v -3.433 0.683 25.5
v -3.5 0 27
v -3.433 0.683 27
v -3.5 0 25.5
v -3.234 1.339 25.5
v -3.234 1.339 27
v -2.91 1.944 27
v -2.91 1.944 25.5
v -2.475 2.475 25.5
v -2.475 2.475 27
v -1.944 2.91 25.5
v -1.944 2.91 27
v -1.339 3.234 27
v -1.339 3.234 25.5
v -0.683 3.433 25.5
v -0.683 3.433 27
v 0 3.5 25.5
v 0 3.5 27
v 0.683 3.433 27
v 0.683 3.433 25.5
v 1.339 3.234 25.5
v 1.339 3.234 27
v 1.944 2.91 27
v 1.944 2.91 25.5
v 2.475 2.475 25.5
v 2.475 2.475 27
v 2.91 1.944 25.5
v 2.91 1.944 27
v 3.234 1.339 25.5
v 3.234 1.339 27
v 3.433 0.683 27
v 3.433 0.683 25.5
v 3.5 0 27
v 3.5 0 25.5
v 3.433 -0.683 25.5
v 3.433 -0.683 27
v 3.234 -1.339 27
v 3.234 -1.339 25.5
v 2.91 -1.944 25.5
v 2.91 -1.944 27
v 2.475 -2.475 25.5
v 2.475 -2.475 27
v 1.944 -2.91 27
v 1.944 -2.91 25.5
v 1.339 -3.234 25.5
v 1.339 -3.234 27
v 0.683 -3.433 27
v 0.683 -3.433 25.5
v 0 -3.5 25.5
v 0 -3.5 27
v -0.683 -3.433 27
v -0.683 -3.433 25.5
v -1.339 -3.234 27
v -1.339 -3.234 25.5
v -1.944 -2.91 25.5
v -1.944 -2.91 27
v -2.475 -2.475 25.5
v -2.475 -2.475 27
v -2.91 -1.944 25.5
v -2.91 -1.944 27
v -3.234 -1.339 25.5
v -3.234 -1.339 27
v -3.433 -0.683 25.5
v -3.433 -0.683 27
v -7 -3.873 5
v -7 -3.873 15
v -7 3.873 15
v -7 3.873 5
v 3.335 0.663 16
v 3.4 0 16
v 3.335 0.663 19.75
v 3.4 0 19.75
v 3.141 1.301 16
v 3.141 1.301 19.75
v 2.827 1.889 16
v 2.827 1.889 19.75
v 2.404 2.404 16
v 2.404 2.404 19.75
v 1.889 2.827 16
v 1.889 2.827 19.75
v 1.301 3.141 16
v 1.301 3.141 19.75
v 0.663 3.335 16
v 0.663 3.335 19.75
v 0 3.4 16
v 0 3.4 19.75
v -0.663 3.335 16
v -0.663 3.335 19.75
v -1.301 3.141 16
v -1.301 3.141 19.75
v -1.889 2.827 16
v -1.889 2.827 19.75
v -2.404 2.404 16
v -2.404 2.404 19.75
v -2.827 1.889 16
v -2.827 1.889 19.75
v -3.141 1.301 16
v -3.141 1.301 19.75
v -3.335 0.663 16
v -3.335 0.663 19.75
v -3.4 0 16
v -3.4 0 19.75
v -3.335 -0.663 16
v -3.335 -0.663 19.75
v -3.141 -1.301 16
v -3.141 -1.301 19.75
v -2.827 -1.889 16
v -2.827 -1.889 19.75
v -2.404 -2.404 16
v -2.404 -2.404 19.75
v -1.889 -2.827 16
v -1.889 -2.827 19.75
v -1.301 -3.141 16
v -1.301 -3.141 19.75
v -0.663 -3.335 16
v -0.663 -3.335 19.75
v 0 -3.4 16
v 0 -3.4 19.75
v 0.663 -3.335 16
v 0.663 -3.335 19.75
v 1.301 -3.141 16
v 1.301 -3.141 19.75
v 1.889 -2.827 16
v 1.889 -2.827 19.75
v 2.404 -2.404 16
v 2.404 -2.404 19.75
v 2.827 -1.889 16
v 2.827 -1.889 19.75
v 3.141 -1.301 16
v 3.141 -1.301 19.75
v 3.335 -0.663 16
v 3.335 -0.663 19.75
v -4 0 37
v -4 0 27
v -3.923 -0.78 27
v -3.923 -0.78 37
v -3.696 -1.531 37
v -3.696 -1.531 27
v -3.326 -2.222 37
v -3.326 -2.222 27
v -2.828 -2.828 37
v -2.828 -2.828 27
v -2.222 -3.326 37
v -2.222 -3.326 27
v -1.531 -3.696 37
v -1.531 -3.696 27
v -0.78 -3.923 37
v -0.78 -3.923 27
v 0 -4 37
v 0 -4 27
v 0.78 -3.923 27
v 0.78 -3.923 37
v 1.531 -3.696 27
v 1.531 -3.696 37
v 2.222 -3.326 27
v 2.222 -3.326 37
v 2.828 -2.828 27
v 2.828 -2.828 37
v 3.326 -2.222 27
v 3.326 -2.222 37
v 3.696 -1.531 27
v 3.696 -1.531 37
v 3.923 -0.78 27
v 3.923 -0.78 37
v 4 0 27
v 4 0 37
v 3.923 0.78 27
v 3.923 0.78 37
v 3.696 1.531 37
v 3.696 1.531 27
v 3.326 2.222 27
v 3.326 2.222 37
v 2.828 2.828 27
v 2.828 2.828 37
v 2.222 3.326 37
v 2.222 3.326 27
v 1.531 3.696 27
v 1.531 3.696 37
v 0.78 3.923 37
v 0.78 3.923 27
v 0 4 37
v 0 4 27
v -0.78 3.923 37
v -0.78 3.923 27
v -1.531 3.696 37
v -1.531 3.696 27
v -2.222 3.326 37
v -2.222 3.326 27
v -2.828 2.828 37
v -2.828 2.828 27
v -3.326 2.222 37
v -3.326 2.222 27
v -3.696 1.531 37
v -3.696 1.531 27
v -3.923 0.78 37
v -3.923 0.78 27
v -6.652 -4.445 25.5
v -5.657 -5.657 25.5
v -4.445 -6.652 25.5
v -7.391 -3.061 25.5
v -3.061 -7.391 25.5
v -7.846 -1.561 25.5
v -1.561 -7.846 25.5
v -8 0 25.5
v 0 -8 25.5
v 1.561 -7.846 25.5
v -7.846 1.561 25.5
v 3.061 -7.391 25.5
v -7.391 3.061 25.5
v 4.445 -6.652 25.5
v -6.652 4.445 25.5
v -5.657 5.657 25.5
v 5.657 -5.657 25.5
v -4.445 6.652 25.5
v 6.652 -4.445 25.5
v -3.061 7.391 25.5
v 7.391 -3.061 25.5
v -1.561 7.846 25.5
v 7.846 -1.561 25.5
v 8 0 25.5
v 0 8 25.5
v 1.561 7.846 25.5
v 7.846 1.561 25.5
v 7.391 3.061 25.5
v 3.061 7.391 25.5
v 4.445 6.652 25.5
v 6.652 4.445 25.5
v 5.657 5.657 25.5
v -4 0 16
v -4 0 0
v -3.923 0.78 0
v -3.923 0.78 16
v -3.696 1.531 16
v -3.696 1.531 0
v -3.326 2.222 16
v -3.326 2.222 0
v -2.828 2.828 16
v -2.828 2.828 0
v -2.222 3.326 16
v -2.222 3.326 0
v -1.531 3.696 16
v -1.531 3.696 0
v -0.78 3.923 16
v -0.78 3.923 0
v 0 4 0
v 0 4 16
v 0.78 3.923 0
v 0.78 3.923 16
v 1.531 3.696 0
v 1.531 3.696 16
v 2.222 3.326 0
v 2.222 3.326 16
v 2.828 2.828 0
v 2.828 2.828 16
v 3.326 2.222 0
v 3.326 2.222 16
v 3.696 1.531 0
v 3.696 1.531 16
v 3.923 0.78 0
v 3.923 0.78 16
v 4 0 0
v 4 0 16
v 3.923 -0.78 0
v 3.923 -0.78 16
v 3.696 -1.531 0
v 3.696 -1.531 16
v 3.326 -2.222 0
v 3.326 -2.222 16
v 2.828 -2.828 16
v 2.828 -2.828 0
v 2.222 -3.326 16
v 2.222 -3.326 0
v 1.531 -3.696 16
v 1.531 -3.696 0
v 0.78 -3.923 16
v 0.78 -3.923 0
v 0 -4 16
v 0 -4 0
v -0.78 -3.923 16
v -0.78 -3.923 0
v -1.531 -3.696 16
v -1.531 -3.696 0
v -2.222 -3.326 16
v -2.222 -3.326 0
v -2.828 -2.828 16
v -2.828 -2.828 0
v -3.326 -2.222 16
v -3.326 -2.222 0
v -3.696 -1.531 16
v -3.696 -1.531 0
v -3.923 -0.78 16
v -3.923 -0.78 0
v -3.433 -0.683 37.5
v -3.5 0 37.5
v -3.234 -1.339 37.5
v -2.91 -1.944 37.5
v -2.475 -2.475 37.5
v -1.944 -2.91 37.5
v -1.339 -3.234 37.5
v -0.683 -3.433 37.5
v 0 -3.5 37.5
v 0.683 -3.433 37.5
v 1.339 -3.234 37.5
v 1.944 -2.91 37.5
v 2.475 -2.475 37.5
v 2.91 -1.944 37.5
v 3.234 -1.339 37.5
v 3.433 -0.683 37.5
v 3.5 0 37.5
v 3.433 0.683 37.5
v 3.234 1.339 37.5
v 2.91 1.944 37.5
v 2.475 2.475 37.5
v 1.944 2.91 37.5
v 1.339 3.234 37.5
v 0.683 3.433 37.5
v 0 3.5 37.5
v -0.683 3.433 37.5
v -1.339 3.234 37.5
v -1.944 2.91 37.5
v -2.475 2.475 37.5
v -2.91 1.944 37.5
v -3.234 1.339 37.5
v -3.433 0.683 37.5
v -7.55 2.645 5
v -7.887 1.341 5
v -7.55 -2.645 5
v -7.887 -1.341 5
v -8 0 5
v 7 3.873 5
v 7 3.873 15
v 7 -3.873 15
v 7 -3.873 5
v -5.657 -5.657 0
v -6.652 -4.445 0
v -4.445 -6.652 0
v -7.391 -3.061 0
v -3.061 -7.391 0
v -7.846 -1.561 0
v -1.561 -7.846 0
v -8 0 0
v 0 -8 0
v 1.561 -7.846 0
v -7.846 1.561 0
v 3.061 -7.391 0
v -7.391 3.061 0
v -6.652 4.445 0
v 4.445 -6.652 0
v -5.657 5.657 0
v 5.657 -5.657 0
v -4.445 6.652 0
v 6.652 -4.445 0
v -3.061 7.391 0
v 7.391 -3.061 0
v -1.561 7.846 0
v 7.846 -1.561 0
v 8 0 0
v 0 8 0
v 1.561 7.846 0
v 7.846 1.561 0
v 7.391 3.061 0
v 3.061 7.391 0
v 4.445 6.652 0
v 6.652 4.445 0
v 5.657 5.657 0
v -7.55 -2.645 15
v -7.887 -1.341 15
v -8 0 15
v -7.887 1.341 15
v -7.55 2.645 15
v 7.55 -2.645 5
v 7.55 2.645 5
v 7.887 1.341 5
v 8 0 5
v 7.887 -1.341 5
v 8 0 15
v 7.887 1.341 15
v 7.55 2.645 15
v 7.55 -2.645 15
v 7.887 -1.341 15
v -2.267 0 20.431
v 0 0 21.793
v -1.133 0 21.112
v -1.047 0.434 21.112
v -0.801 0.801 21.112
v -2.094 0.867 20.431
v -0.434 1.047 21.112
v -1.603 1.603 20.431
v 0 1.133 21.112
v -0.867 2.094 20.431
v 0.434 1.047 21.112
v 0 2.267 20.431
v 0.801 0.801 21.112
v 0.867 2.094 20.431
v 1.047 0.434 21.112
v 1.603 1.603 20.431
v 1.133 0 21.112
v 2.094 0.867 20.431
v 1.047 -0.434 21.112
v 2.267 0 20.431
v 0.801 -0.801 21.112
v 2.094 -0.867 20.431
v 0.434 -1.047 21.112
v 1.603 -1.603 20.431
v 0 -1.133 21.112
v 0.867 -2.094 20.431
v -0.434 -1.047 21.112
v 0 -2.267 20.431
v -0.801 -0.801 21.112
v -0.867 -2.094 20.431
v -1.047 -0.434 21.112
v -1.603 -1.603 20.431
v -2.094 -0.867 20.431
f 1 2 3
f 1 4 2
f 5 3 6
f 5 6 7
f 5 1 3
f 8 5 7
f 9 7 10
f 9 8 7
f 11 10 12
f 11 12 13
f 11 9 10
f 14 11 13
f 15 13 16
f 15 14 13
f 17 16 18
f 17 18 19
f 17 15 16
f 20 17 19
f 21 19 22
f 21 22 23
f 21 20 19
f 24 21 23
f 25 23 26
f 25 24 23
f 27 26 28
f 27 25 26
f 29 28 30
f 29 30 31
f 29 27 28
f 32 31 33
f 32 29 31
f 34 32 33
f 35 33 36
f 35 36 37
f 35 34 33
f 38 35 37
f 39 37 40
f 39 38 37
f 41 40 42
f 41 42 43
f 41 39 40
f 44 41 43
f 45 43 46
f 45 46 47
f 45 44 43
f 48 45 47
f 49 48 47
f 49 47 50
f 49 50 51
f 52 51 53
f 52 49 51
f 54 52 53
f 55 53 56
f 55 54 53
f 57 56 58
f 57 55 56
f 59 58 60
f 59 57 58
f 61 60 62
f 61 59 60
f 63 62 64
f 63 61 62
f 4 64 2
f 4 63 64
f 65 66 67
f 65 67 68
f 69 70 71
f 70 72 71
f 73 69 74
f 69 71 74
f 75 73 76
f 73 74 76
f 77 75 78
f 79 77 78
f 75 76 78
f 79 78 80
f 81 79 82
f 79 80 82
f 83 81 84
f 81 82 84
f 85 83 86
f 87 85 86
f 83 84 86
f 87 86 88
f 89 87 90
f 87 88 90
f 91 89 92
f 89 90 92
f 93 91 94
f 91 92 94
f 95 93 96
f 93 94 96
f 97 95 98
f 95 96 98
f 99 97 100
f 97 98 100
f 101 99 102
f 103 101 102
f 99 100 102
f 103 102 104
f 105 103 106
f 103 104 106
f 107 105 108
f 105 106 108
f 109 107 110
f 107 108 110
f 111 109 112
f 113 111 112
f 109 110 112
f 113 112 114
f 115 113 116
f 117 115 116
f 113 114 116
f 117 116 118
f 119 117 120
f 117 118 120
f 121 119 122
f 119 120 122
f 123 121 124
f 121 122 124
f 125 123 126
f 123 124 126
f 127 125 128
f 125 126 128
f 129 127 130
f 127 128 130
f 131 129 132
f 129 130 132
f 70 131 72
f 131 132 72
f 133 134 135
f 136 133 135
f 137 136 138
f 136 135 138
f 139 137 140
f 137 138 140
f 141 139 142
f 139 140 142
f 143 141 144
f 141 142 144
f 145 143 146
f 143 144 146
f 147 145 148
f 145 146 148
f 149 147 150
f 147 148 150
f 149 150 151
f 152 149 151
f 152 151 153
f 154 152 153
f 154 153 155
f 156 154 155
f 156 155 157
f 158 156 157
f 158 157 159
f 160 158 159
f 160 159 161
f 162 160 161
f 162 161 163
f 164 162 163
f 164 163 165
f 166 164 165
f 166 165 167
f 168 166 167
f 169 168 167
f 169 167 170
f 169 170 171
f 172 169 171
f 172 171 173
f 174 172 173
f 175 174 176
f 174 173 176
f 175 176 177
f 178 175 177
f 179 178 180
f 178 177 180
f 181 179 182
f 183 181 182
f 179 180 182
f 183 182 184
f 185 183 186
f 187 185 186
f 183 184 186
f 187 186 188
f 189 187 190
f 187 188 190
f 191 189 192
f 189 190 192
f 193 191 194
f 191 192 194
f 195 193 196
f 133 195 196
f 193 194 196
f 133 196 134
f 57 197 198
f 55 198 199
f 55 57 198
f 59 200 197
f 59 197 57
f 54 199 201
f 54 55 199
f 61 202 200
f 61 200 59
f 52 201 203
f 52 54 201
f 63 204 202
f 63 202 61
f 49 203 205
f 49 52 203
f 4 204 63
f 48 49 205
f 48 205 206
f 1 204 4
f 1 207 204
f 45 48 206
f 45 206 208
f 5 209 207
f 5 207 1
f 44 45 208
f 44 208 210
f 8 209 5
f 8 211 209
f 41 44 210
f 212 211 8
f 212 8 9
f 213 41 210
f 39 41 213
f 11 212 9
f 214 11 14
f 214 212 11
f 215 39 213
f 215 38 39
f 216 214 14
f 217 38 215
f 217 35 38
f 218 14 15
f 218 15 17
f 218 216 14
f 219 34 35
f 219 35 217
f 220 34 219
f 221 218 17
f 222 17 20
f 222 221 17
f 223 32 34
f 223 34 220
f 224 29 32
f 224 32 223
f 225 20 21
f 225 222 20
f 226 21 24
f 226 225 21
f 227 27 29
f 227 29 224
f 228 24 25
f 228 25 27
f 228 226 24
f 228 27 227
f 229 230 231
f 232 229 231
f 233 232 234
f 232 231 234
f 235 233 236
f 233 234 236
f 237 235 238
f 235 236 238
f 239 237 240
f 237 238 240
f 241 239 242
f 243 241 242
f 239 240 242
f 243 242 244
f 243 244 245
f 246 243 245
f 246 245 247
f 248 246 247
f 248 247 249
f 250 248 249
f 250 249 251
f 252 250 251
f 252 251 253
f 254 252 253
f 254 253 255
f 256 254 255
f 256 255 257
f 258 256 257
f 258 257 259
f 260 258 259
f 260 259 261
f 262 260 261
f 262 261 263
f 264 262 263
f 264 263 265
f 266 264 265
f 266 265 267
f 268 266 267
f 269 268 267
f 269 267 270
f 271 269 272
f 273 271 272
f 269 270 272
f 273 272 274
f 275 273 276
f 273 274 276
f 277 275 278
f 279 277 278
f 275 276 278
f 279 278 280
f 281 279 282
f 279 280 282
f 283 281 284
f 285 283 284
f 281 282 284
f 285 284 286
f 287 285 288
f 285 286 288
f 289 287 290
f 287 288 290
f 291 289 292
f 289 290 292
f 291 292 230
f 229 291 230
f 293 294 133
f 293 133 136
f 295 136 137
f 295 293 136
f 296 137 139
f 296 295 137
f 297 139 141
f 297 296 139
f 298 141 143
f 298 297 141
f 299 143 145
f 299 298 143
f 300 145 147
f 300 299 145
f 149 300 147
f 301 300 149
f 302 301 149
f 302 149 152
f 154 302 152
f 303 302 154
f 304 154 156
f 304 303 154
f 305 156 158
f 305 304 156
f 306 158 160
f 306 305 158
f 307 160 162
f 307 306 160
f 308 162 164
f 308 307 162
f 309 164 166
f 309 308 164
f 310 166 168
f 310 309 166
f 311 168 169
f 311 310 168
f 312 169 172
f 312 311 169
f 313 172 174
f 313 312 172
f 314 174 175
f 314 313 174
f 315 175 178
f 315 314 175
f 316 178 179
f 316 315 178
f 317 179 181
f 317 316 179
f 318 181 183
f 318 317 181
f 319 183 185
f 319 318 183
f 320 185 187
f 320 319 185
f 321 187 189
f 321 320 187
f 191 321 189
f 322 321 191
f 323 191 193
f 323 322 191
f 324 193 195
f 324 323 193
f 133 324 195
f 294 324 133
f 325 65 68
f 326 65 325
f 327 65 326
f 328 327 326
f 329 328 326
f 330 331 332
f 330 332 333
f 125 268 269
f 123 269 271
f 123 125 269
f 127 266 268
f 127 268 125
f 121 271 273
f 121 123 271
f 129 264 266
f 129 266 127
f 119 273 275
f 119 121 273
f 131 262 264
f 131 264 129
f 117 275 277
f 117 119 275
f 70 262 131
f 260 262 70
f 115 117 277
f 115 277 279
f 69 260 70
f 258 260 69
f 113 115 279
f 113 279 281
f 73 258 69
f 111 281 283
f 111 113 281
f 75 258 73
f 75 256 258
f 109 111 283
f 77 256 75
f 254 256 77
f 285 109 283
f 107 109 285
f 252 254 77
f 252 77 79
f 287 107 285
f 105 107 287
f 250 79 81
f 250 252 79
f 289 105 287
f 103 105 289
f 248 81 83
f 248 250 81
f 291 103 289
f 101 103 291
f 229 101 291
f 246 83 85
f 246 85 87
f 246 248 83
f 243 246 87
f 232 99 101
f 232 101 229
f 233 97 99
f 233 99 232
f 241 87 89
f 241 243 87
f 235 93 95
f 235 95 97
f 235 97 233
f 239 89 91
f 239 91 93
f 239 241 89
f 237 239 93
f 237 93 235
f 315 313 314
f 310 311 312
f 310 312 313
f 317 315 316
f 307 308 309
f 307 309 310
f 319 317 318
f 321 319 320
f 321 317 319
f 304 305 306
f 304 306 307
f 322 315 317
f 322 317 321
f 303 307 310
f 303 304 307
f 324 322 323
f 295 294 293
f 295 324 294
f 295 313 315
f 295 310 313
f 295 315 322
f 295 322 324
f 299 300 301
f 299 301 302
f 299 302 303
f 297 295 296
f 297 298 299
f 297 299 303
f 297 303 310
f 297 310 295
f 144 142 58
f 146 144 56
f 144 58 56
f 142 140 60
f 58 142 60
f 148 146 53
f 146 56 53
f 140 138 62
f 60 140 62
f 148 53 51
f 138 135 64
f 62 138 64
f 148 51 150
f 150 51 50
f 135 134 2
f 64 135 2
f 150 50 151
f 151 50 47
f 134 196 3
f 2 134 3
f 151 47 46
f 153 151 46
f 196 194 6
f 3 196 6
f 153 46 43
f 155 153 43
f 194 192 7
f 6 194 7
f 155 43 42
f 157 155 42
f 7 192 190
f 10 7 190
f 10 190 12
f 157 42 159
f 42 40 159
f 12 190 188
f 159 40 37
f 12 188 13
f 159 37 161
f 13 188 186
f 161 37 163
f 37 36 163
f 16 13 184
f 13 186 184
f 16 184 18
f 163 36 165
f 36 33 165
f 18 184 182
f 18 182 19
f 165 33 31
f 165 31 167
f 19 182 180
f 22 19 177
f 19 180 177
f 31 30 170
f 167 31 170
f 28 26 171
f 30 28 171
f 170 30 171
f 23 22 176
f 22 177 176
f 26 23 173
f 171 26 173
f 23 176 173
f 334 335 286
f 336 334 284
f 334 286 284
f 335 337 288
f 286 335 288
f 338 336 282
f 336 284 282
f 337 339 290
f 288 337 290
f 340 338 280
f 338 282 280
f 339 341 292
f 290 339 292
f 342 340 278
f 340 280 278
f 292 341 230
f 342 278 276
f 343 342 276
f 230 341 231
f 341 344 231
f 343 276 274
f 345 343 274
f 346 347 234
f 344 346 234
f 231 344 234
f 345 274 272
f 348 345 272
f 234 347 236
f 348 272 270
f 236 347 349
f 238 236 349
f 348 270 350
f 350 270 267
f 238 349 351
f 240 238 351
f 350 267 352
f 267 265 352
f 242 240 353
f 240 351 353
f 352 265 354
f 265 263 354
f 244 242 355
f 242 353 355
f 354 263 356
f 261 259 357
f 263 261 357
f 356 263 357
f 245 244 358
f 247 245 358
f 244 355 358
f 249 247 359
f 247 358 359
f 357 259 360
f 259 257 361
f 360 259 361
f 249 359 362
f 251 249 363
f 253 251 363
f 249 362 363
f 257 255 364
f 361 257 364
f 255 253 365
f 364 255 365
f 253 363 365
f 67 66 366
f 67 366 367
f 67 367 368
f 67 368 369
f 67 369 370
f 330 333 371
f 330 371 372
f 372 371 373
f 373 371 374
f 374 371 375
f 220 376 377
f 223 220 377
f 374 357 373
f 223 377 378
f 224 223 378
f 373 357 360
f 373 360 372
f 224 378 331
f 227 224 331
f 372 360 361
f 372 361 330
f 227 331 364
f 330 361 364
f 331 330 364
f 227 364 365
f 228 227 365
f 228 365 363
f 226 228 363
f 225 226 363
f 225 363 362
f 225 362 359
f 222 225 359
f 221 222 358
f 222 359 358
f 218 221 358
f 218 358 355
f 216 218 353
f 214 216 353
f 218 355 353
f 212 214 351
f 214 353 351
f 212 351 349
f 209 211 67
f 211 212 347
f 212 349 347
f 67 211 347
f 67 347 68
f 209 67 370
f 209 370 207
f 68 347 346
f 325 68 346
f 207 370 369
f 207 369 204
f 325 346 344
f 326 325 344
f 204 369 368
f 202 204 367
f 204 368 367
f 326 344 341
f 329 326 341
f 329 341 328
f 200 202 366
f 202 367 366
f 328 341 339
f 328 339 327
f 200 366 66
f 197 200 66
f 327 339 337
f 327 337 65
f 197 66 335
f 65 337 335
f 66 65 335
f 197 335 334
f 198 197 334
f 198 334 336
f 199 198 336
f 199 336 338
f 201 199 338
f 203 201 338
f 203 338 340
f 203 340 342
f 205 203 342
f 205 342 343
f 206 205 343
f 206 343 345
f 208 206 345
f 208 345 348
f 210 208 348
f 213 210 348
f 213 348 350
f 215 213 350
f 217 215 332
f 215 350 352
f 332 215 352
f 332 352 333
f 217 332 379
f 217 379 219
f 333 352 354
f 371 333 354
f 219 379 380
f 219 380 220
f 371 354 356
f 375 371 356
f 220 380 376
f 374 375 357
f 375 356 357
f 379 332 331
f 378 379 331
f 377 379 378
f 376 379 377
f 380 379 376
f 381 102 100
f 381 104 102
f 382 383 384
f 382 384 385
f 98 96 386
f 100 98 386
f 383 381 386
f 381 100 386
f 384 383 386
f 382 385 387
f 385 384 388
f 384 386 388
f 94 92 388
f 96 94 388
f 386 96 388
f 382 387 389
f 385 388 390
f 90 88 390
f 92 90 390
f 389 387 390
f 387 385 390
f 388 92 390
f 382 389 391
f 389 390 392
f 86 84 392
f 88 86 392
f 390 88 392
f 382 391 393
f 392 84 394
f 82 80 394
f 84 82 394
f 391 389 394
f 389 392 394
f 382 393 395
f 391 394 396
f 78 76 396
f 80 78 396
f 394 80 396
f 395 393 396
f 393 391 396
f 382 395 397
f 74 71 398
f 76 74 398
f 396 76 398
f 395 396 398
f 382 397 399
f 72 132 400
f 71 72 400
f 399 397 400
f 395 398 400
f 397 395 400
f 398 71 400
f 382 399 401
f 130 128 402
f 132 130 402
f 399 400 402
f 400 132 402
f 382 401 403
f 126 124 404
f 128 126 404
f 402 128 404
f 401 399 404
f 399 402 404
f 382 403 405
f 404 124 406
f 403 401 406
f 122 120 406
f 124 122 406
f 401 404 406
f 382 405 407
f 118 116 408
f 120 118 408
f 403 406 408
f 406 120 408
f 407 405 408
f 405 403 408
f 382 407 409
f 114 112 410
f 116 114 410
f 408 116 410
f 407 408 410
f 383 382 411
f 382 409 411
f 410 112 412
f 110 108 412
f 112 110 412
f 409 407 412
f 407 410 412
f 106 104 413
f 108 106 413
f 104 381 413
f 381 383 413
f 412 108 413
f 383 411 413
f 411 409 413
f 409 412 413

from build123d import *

# Parameters (mm, degrees)
SKETCH_1_R                   = 8
EXTRUDE_1_DEPTH              = 25.5
SKETCH_2_W                   = 1
SKETCH_2_H                   = 10
CUT_EXTRUDE_2_DEPTH          = 9.25
HOLE_WIZARD_M8_1_D           = 6.8
HOLE_WIZARD_M8_1_DEPTH       = 19.75
HOLE_WIZARD_M8_1_CBORE_D     = 8
HOLE_WIZARD_M8_1_CBORE_DEPTH = 16
HOLE_WIZARD_M8_1_TIP         = 2.042926105
SKETCH_4_R                   = 4
EXTRUDE_3_DEPTH              = 12
CHAMFER_1_SIZE               = 0.5
SKETCH_5_W                   = 1.5
SKETCH_5_H                   = 0.930014358


with BuildPart() as part:
    # 草图1 → 拉伸1 (new body)
    with BuildSketch(Plane.XY):
        Circle(SKETCH_1_R)
    extrude(amount=EXTRUDE_1_DEPTH)

    # 草图2 → 拉伸2 (cut, symmetric)
    with BuildSketch(Plane(origin=(0, 0, 0), x_dir=(1, 0, 0), z_dir=(0, 1, 0))):
        with Locations((-7.5, -10)):
            Rectangle(SKETCH_2_W, SKETCH_2_H)
        with Locations((7.5, -10)):
            Rectangle(SKETCH_2_W, SKETCH_2_H)
    extrude(amount=CUT_EXTRUDE_2_DEPTH, both=True, mode=Mode.SUBTRACT)

    # M8 螺纹孔1
    with Locations(Plane(origin=(0, 0, 0), x_dir=(-1, 0, 0), z_dir=(0, 0, -1))):
        with Locations((0, 0)):
            CounterBoreHole(HOLE_WIZARD_M8_1_D / 2, HOLE_WIZARD_M8_1_CBORE_D / 2, HOLE_WIZARD_M8_1_CBORE_DEPTH, depth=HOLE_WIZARD_M8_1_DEPTH)
            with Locations((0, 0, -(HOLE_WIZARD_M8_1_DEPTH + HOLE_WIZARD_M8_1_TIP / 2))):  # 118° drill point
                Cone(0, HOLE_WIZARD_M8_1_D / 2, HOLE_WIZARD_M8_1_TIP, mode=Mode.SUBTRACT)

    # 草图4 → 拉伸3 (add)
    with BuildSketch(Plane.XY.offset(25.5)):
        with Locations(Location((0, 0, 0), (0, 0, 180))):
            Circle(SKETCH_4_R)
    extrude(amount=EXTRUDE_3_DEPTH)

    # 倒角1
    chamfer_1_edges = [part.edges().sort_by_distance(p)[0] for p in [
        (4, 0, 37.5),
    ]]
    chamfer(chamfer_1_edges, length=CHAMFER_1_SIZE)

    # 草图5 → 切除-旋转1 (revolve, cut)
    with BuildSketch(Plane(origin=(0, 0, 0), x_dir=(0, 0, -1), z_dir=(1, 0, 0)), mode=Mode.PRIVATE) as cut_revolve_1_sk:
        with Locations((-26.25, 3.965007179)):
            Rectangle(SKETCH_5_W, SKETCH_5_H)
    revolve(cut_revolve_1_sk.sketch.rotate(Axis((0, 0, 25.5), (0, 0, -1)), 270), axis=Axis((0, 0, 25.5), (0, 0, -1)), mode=Mode.SUBTRACT)


solid = part.part
